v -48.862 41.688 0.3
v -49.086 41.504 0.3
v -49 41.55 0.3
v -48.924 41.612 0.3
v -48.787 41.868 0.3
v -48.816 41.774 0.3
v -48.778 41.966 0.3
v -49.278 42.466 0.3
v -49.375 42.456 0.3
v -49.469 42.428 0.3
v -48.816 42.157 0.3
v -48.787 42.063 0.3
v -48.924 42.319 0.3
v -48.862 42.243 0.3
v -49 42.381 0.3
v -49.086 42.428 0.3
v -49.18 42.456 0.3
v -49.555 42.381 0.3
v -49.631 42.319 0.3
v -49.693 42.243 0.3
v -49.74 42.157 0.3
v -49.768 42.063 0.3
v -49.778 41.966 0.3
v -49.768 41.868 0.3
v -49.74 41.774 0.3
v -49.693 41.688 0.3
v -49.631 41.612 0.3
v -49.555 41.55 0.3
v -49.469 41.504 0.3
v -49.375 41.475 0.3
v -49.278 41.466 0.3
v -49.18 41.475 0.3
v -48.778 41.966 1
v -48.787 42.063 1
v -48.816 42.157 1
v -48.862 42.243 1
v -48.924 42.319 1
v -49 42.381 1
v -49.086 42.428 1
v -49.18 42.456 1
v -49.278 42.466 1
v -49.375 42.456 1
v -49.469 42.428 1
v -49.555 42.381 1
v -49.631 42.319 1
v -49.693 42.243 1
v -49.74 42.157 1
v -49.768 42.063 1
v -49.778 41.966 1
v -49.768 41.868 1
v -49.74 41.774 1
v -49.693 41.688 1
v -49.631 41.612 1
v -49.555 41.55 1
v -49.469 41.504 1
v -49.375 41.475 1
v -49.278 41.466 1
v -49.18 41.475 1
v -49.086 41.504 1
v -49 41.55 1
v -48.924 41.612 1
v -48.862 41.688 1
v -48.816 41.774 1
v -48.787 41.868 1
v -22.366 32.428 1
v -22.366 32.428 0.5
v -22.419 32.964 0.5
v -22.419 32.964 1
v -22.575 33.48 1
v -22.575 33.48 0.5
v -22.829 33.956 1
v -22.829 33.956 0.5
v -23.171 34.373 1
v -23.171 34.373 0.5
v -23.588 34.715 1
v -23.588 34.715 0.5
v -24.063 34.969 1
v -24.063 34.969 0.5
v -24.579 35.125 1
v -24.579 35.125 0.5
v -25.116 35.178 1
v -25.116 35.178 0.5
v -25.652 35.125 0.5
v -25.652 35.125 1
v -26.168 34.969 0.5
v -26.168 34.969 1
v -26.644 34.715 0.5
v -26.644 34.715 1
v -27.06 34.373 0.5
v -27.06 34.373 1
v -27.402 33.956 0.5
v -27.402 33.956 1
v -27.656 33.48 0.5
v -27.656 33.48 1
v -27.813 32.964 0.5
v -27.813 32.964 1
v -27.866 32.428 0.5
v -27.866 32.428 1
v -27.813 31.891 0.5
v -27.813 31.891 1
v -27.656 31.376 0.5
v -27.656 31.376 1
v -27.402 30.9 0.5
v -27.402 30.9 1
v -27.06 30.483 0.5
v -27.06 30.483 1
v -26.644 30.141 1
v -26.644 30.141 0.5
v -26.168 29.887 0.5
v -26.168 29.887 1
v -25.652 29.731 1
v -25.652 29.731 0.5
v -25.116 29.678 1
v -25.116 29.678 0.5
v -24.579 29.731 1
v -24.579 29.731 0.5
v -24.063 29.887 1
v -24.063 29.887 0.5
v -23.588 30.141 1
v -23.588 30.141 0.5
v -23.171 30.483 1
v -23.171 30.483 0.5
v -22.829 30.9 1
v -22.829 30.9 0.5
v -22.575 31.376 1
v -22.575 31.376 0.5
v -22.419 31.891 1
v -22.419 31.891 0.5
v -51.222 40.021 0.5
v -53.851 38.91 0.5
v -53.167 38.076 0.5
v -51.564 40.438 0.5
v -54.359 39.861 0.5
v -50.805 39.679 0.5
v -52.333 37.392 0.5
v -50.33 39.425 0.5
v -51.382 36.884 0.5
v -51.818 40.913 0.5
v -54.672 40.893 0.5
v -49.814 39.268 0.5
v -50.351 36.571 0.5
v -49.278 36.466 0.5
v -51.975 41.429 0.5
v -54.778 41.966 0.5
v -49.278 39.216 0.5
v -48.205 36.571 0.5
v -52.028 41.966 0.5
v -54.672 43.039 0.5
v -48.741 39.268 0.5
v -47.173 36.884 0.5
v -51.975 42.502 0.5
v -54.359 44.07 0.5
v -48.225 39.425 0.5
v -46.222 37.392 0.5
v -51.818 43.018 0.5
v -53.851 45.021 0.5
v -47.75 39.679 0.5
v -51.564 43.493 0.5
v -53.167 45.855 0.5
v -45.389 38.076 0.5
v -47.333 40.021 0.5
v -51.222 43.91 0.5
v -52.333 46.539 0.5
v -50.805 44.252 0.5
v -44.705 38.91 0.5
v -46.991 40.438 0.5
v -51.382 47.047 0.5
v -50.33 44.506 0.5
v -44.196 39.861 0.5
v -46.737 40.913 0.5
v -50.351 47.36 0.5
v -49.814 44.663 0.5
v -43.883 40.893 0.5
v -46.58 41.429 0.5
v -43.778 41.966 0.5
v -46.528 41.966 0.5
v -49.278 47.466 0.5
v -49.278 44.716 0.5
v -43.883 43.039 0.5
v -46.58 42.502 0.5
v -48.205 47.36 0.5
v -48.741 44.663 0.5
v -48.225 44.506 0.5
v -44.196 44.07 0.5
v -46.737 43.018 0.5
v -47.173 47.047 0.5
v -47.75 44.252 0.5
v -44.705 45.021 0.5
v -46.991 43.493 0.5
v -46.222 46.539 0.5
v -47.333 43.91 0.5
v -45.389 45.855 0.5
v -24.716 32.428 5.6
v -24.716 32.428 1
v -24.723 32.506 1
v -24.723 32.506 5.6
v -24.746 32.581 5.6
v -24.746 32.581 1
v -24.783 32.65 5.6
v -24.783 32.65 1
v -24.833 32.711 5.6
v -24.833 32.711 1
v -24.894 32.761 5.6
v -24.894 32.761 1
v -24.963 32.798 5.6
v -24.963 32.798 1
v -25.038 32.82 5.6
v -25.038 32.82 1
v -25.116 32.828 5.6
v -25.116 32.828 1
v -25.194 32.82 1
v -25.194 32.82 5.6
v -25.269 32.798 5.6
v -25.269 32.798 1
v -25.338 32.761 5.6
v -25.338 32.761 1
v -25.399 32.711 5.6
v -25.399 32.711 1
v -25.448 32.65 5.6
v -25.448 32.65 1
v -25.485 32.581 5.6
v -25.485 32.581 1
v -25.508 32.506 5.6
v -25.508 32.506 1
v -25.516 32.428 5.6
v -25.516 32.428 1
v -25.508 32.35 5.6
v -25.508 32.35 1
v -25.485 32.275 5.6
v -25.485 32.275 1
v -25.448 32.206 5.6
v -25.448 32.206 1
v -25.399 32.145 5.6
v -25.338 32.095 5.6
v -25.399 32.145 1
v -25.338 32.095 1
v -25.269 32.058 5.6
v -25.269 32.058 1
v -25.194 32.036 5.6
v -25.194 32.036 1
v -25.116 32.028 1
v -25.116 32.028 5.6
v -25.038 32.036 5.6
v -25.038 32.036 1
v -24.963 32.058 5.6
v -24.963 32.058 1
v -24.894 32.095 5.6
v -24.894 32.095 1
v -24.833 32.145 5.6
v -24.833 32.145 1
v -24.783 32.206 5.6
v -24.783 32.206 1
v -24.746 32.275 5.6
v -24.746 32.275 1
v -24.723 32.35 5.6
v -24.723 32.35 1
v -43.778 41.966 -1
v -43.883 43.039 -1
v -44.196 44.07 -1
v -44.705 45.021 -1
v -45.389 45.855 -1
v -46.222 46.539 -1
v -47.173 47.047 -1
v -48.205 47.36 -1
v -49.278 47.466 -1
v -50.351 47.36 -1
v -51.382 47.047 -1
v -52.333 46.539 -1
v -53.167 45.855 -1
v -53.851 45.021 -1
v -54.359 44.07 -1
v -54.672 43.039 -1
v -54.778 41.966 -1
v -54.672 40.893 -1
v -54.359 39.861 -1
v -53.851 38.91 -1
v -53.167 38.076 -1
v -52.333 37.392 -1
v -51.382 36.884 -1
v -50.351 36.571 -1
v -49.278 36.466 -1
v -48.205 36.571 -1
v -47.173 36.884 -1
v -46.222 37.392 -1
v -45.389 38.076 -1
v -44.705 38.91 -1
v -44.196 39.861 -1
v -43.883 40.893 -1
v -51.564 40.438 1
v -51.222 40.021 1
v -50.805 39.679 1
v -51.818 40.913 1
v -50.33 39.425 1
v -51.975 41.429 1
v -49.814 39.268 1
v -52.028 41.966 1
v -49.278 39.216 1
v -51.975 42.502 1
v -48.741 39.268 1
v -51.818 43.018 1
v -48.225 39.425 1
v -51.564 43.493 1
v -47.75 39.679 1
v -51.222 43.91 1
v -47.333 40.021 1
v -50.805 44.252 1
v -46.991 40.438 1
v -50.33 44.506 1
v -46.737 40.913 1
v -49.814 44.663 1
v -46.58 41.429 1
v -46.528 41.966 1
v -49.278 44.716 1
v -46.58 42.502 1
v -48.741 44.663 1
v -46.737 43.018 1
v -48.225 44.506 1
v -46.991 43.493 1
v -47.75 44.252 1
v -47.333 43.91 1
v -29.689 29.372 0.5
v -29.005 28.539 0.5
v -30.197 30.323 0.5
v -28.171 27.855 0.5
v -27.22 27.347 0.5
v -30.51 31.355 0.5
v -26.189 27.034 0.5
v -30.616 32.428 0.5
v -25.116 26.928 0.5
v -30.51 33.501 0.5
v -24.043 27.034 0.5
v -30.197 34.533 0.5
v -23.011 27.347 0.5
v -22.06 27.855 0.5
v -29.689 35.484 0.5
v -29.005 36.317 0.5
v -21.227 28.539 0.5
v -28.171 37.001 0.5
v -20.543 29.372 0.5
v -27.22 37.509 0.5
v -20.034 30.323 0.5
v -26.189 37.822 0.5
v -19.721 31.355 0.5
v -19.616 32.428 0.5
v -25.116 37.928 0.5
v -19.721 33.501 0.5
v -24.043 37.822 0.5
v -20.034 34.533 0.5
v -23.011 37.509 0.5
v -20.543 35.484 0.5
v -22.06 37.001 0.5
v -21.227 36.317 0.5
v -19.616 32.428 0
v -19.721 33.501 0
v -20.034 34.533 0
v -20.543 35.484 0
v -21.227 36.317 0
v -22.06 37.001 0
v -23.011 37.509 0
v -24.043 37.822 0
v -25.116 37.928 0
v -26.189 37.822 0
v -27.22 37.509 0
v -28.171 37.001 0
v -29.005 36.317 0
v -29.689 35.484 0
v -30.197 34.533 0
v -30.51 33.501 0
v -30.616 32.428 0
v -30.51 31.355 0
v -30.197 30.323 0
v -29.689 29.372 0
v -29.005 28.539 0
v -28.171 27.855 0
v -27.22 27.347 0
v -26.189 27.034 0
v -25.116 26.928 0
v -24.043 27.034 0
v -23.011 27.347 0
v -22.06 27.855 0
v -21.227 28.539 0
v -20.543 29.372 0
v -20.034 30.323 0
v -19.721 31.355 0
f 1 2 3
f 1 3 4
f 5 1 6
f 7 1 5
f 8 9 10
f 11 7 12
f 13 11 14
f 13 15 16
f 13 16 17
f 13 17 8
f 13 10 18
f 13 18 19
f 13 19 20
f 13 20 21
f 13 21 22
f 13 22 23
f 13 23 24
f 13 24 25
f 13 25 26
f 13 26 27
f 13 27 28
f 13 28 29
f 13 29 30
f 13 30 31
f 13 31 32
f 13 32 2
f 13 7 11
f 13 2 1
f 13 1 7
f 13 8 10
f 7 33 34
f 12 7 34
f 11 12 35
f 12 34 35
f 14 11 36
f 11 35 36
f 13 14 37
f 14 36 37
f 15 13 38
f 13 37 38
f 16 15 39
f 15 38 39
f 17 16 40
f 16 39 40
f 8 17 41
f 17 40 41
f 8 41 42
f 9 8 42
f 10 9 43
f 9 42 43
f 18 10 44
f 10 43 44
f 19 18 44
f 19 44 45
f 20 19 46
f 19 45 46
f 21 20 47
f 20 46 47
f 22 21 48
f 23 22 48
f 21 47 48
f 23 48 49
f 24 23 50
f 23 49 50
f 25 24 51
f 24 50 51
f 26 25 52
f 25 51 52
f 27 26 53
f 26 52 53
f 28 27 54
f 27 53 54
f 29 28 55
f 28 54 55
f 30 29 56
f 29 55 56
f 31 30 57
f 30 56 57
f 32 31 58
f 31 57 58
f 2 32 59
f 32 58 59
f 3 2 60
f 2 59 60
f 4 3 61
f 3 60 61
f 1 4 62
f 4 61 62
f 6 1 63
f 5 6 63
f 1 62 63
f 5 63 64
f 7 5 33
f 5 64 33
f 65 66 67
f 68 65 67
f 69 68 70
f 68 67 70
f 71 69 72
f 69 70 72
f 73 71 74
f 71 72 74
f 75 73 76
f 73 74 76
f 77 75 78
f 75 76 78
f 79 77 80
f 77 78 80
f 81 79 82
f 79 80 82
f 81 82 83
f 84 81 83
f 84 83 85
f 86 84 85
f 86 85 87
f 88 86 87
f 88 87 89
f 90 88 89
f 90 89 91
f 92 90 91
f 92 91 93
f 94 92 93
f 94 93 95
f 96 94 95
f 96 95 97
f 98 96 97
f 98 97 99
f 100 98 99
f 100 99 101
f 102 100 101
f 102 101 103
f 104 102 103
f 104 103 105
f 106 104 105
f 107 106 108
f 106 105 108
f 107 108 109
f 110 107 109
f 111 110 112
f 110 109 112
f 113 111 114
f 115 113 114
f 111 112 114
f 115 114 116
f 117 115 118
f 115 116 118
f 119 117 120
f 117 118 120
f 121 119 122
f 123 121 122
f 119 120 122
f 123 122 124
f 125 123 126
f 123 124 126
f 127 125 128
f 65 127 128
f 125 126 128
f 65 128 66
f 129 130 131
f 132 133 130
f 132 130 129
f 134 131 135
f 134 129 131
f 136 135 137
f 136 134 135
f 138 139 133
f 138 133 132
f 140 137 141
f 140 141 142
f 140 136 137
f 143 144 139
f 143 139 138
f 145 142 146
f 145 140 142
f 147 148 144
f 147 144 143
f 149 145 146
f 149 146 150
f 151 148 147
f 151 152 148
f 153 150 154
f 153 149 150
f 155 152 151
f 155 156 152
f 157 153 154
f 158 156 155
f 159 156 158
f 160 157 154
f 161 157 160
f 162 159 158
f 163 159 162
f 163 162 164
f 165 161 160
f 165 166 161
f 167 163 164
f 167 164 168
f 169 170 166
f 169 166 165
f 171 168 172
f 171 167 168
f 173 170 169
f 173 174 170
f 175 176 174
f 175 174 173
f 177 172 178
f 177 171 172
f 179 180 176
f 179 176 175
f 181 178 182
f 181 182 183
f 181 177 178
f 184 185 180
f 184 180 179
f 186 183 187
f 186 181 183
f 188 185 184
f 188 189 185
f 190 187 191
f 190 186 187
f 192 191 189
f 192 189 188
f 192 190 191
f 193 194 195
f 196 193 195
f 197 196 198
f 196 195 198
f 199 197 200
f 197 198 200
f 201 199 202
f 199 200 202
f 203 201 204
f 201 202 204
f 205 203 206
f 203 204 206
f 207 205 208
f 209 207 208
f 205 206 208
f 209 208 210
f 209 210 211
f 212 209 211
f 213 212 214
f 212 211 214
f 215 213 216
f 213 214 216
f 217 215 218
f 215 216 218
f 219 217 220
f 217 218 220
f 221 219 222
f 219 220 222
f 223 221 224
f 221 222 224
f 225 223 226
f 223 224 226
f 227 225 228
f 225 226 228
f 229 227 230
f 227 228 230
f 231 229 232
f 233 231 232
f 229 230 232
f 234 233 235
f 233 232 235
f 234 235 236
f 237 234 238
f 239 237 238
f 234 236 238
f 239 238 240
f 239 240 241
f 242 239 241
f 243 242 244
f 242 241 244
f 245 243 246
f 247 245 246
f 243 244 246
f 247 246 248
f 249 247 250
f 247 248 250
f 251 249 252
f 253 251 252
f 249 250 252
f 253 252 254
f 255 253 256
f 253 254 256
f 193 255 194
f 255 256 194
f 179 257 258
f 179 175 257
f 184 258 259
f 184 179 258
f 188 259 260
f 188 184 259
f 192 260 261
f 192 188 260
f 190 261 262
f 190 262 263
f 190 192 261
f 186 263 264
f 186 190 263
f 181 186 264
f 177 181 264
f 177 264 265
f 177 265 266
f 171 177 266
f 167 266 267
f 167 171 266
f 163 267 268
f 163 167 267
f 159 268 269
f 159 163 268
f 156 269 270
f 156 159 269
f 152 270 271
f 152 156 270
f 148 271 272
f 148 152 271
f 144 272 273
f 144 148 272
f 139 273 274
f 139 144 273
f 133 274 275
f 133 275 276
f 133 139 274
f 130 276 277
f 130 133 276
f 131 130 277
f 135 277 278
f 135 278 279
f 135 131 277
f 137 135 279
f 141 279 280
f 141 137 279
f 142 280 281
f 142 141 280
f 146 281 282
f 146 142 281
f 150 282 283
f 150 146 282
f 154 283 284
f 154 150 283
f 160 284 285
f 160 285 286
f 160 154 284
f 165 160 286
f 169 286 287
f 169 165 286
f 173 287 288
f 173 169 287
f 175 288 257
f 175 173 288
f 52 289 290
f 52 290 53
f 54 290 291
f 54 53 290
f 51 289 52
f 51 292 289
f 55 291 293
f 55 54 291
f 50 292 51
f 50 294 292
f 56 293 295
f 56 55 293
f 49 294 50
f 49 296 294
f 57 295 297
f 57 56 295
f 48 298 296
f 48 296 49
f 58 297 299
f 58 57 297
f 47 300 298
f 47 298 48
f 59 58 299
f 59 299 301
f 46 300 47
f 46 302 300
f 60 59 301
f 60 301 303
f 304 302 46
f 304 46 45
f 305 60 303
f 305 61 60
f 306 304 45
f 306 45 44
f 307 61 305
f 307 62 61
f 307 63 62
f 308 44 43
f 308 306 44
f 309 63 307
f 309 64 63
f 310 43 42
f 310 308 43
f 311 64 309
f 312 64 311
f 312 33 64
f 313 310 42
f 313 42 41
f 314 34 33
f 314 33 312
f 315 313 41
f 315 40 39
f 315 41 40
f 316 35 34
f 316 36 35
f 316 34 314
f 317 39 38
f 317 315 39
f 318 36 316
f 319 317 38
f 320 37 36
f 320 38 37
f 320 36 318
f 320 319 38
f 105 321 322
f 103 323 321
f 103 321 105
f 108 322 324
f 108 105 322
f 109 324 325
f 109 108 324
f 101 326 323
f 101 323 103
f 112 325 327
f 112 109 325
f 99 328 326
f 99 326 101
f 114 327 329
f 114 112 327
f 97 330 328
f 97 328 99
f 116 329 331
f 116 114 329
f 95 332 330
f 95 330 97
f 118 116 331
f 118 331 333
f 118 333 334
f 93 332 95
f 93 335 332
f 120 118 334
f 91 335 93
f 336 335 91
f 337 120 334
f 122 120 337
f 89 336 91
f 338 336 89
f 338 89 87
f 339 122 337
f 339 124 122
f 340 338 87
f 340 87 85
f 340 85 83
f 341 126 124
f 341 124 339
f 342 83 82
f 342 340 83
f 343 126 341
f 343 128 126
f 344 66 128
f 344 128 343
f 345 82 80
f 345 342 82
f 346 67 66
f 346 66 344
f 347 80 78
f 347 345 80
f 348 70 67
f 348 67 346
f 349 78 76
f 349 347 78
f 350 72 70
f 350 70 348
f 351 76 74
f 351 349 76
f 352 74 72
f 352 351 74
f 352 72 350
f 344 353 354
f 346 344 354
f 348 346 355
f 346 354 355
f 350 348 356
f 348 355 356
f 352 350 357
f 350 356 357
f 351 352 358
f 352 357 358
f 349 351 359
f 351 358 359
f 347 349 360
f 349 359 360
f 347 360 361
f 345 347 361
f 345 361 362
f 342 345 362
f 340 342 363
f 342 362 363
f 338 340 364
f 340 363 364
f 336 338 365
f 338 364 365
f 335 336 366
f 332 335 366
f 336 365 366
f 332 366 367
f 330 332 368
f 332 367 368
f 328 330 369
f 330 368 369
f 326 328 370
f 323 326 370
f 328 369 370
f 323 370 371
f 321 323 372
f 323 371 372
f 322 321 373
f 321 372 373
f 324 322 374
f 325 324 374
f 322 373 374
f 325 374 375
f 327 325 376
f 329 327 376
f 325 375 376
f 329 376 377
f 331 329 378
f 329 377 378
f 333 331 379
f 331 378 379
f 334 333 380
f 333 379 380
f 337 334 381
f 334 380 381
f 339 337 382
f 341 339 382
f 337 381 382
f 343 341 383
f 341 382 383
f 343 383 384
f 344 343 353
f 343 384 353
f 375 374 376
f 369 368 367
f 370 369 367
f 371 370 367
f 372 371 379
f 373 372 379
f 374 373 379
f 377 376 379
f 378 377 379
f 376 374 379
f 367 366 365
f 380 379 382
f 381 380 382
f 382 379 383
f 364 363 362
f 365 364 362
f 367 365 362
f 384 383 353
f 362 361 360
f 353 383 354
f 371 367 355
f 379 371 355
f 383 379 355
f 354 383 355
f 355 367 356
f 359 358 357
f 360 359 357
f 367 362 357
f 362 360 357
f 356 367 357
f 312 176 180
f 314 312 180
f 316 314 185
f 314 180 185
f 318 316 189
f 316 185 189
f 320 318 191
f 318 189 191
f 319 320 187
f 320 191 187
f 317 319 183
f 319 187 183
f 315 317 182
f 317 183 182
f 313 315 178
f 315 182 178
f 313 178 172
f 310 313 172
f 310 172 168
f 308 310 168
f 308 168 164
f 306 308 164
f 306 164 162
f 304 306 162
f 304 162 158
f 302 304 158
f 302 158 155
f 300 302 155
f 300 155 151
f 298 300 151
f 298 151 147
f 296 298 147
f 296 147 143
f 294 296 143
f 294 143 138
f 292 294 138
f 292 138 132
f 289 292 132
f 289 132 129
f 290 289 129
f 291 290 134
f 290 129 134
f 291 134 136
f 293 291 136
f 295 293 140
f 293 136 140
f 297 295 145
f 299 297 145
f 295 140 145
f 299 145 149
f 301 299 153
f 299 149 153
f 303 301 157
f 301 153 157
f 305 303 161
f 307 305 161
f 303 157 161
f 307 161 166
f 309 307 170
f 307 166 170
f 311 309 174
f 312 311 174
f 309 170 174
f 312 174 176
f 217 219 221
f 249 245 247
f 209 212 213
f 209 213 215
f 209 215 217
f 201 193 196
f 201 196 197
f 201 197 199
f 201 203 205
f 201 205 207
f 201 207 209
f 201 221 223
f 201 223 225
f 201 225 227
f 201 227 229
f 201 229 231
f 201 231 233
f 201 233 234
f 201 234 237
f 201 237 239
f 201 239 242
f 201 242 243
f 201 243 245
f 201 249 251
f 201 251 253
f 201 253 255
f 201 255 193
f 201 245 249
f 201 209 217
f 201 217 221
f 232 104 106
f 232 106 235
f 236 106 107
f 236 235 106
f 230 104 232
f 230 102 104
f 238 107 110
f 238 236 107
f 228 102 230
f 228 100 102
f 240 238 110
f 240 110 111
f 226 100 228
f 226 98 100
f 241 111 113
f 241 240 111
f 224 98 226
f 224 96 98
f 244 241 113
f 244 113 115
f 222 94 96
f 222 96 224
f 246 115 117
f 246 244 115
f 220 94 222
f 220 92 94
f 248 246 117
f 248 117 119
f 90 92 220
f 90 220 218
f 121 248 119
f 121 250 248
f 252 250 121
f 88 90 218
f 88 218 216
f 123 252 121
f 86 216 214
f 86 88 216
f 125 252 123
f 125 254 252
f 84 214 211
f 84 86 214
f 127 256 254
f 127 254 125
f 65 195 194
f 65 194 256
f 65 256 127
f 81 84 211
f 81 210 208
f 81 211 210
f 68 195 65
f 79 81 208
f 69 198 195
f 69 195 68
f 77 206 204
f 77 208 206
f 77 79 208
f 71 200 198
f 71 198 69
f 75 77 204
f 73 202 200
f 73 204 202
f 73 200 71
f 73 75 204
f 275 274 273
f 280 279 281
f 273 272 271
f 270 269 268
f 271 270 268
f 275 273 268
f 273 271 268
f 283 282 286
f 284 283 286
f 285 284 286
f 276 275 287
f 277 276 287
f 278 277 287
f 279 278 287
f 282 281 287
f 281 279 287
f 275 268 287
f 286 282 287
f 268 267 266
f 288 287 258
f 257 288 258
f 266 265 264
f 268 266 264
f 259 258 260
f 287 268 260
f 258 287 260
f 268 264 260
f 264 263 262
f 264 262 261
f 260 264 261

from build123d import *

# Parameters (mm, degrees)
F0_R      = 5.5
F1_DEPTH  = 0.5
F2_R      = 5.5
F3_DEPTH  = 0.5
F4_R      = 2.75
F5_DEPTH  = 1
F6_R      = 2.75
F7_DEPTH  = 1
F8_R      = 0.5
F9_DEPTH  = 0.7
F10_R     = 0.4
F11_DEPTH = 4.6
F13_DEPTH = 1


# Not quite as in the source:
# - the program builds the solid bodies; features that only make, move or delete a surface that nothing else refers to are left out


with BuildPart() as f1:
    # F0 (on Top) → F1 (new body)
    with BuildSketch(Plane.XY):
        with Locations((-49.2776818573, 41.9655069709)):
            Circle(F0_R)
    extrude(amount=F1_DEPTH)

    # F4 (on Top) → F5 (join)
    with BuildSketch(Plane.XY):
        with Locations((-49.2776595056, 41.9656410813)):
            Circle(F4_R)
    extrude(amount=F5_DEPTH)

    # F8 (on face) → F9 (cut)
    with BuildSketch(Plane.XY.offset(1)):
        with Locations((-49.2776595056, 41.9656410813)):
            Circle(F8_R)
    extrude(amount=-F9_DEPTH, mode=Mode.SUBTRACT)

    # F0 (on Top) → F13 (join)
    with BuildSketch(Plane.XY):
        with Locations((-49.2776818573, 41.9655069709)):
            Circle(F0_R)
    extrude(amount=-F13_DEPTH)


with BuildPart() as f3:
    # F2 (on Top) → F3 (new body)
    with BuildSketch(Plane.XY):
        with Locations((-25.1157227904, 32.4278958142)):
            Circle(F2_R)
    extrude(amount=F3_DEPTH)

    # F6 (on Top) → F7 (join)
    with BuildSketch(Plane.XY):
        with Locations((-25.1157619059, 32.4279852211)):
            Circle(F6_R)
    extrude(amount=F7_DEPTH)

    # F10 (on face) → F11 (join)
    with BuildSketch(Plane.XY.offset(1)):
        with Locations((-25.1157619059, 32.4279852211)):
            Circle(F10_R)
    extrude(amount=F11_DEPTH)


solid = Compound([f1.part, f3.part])
